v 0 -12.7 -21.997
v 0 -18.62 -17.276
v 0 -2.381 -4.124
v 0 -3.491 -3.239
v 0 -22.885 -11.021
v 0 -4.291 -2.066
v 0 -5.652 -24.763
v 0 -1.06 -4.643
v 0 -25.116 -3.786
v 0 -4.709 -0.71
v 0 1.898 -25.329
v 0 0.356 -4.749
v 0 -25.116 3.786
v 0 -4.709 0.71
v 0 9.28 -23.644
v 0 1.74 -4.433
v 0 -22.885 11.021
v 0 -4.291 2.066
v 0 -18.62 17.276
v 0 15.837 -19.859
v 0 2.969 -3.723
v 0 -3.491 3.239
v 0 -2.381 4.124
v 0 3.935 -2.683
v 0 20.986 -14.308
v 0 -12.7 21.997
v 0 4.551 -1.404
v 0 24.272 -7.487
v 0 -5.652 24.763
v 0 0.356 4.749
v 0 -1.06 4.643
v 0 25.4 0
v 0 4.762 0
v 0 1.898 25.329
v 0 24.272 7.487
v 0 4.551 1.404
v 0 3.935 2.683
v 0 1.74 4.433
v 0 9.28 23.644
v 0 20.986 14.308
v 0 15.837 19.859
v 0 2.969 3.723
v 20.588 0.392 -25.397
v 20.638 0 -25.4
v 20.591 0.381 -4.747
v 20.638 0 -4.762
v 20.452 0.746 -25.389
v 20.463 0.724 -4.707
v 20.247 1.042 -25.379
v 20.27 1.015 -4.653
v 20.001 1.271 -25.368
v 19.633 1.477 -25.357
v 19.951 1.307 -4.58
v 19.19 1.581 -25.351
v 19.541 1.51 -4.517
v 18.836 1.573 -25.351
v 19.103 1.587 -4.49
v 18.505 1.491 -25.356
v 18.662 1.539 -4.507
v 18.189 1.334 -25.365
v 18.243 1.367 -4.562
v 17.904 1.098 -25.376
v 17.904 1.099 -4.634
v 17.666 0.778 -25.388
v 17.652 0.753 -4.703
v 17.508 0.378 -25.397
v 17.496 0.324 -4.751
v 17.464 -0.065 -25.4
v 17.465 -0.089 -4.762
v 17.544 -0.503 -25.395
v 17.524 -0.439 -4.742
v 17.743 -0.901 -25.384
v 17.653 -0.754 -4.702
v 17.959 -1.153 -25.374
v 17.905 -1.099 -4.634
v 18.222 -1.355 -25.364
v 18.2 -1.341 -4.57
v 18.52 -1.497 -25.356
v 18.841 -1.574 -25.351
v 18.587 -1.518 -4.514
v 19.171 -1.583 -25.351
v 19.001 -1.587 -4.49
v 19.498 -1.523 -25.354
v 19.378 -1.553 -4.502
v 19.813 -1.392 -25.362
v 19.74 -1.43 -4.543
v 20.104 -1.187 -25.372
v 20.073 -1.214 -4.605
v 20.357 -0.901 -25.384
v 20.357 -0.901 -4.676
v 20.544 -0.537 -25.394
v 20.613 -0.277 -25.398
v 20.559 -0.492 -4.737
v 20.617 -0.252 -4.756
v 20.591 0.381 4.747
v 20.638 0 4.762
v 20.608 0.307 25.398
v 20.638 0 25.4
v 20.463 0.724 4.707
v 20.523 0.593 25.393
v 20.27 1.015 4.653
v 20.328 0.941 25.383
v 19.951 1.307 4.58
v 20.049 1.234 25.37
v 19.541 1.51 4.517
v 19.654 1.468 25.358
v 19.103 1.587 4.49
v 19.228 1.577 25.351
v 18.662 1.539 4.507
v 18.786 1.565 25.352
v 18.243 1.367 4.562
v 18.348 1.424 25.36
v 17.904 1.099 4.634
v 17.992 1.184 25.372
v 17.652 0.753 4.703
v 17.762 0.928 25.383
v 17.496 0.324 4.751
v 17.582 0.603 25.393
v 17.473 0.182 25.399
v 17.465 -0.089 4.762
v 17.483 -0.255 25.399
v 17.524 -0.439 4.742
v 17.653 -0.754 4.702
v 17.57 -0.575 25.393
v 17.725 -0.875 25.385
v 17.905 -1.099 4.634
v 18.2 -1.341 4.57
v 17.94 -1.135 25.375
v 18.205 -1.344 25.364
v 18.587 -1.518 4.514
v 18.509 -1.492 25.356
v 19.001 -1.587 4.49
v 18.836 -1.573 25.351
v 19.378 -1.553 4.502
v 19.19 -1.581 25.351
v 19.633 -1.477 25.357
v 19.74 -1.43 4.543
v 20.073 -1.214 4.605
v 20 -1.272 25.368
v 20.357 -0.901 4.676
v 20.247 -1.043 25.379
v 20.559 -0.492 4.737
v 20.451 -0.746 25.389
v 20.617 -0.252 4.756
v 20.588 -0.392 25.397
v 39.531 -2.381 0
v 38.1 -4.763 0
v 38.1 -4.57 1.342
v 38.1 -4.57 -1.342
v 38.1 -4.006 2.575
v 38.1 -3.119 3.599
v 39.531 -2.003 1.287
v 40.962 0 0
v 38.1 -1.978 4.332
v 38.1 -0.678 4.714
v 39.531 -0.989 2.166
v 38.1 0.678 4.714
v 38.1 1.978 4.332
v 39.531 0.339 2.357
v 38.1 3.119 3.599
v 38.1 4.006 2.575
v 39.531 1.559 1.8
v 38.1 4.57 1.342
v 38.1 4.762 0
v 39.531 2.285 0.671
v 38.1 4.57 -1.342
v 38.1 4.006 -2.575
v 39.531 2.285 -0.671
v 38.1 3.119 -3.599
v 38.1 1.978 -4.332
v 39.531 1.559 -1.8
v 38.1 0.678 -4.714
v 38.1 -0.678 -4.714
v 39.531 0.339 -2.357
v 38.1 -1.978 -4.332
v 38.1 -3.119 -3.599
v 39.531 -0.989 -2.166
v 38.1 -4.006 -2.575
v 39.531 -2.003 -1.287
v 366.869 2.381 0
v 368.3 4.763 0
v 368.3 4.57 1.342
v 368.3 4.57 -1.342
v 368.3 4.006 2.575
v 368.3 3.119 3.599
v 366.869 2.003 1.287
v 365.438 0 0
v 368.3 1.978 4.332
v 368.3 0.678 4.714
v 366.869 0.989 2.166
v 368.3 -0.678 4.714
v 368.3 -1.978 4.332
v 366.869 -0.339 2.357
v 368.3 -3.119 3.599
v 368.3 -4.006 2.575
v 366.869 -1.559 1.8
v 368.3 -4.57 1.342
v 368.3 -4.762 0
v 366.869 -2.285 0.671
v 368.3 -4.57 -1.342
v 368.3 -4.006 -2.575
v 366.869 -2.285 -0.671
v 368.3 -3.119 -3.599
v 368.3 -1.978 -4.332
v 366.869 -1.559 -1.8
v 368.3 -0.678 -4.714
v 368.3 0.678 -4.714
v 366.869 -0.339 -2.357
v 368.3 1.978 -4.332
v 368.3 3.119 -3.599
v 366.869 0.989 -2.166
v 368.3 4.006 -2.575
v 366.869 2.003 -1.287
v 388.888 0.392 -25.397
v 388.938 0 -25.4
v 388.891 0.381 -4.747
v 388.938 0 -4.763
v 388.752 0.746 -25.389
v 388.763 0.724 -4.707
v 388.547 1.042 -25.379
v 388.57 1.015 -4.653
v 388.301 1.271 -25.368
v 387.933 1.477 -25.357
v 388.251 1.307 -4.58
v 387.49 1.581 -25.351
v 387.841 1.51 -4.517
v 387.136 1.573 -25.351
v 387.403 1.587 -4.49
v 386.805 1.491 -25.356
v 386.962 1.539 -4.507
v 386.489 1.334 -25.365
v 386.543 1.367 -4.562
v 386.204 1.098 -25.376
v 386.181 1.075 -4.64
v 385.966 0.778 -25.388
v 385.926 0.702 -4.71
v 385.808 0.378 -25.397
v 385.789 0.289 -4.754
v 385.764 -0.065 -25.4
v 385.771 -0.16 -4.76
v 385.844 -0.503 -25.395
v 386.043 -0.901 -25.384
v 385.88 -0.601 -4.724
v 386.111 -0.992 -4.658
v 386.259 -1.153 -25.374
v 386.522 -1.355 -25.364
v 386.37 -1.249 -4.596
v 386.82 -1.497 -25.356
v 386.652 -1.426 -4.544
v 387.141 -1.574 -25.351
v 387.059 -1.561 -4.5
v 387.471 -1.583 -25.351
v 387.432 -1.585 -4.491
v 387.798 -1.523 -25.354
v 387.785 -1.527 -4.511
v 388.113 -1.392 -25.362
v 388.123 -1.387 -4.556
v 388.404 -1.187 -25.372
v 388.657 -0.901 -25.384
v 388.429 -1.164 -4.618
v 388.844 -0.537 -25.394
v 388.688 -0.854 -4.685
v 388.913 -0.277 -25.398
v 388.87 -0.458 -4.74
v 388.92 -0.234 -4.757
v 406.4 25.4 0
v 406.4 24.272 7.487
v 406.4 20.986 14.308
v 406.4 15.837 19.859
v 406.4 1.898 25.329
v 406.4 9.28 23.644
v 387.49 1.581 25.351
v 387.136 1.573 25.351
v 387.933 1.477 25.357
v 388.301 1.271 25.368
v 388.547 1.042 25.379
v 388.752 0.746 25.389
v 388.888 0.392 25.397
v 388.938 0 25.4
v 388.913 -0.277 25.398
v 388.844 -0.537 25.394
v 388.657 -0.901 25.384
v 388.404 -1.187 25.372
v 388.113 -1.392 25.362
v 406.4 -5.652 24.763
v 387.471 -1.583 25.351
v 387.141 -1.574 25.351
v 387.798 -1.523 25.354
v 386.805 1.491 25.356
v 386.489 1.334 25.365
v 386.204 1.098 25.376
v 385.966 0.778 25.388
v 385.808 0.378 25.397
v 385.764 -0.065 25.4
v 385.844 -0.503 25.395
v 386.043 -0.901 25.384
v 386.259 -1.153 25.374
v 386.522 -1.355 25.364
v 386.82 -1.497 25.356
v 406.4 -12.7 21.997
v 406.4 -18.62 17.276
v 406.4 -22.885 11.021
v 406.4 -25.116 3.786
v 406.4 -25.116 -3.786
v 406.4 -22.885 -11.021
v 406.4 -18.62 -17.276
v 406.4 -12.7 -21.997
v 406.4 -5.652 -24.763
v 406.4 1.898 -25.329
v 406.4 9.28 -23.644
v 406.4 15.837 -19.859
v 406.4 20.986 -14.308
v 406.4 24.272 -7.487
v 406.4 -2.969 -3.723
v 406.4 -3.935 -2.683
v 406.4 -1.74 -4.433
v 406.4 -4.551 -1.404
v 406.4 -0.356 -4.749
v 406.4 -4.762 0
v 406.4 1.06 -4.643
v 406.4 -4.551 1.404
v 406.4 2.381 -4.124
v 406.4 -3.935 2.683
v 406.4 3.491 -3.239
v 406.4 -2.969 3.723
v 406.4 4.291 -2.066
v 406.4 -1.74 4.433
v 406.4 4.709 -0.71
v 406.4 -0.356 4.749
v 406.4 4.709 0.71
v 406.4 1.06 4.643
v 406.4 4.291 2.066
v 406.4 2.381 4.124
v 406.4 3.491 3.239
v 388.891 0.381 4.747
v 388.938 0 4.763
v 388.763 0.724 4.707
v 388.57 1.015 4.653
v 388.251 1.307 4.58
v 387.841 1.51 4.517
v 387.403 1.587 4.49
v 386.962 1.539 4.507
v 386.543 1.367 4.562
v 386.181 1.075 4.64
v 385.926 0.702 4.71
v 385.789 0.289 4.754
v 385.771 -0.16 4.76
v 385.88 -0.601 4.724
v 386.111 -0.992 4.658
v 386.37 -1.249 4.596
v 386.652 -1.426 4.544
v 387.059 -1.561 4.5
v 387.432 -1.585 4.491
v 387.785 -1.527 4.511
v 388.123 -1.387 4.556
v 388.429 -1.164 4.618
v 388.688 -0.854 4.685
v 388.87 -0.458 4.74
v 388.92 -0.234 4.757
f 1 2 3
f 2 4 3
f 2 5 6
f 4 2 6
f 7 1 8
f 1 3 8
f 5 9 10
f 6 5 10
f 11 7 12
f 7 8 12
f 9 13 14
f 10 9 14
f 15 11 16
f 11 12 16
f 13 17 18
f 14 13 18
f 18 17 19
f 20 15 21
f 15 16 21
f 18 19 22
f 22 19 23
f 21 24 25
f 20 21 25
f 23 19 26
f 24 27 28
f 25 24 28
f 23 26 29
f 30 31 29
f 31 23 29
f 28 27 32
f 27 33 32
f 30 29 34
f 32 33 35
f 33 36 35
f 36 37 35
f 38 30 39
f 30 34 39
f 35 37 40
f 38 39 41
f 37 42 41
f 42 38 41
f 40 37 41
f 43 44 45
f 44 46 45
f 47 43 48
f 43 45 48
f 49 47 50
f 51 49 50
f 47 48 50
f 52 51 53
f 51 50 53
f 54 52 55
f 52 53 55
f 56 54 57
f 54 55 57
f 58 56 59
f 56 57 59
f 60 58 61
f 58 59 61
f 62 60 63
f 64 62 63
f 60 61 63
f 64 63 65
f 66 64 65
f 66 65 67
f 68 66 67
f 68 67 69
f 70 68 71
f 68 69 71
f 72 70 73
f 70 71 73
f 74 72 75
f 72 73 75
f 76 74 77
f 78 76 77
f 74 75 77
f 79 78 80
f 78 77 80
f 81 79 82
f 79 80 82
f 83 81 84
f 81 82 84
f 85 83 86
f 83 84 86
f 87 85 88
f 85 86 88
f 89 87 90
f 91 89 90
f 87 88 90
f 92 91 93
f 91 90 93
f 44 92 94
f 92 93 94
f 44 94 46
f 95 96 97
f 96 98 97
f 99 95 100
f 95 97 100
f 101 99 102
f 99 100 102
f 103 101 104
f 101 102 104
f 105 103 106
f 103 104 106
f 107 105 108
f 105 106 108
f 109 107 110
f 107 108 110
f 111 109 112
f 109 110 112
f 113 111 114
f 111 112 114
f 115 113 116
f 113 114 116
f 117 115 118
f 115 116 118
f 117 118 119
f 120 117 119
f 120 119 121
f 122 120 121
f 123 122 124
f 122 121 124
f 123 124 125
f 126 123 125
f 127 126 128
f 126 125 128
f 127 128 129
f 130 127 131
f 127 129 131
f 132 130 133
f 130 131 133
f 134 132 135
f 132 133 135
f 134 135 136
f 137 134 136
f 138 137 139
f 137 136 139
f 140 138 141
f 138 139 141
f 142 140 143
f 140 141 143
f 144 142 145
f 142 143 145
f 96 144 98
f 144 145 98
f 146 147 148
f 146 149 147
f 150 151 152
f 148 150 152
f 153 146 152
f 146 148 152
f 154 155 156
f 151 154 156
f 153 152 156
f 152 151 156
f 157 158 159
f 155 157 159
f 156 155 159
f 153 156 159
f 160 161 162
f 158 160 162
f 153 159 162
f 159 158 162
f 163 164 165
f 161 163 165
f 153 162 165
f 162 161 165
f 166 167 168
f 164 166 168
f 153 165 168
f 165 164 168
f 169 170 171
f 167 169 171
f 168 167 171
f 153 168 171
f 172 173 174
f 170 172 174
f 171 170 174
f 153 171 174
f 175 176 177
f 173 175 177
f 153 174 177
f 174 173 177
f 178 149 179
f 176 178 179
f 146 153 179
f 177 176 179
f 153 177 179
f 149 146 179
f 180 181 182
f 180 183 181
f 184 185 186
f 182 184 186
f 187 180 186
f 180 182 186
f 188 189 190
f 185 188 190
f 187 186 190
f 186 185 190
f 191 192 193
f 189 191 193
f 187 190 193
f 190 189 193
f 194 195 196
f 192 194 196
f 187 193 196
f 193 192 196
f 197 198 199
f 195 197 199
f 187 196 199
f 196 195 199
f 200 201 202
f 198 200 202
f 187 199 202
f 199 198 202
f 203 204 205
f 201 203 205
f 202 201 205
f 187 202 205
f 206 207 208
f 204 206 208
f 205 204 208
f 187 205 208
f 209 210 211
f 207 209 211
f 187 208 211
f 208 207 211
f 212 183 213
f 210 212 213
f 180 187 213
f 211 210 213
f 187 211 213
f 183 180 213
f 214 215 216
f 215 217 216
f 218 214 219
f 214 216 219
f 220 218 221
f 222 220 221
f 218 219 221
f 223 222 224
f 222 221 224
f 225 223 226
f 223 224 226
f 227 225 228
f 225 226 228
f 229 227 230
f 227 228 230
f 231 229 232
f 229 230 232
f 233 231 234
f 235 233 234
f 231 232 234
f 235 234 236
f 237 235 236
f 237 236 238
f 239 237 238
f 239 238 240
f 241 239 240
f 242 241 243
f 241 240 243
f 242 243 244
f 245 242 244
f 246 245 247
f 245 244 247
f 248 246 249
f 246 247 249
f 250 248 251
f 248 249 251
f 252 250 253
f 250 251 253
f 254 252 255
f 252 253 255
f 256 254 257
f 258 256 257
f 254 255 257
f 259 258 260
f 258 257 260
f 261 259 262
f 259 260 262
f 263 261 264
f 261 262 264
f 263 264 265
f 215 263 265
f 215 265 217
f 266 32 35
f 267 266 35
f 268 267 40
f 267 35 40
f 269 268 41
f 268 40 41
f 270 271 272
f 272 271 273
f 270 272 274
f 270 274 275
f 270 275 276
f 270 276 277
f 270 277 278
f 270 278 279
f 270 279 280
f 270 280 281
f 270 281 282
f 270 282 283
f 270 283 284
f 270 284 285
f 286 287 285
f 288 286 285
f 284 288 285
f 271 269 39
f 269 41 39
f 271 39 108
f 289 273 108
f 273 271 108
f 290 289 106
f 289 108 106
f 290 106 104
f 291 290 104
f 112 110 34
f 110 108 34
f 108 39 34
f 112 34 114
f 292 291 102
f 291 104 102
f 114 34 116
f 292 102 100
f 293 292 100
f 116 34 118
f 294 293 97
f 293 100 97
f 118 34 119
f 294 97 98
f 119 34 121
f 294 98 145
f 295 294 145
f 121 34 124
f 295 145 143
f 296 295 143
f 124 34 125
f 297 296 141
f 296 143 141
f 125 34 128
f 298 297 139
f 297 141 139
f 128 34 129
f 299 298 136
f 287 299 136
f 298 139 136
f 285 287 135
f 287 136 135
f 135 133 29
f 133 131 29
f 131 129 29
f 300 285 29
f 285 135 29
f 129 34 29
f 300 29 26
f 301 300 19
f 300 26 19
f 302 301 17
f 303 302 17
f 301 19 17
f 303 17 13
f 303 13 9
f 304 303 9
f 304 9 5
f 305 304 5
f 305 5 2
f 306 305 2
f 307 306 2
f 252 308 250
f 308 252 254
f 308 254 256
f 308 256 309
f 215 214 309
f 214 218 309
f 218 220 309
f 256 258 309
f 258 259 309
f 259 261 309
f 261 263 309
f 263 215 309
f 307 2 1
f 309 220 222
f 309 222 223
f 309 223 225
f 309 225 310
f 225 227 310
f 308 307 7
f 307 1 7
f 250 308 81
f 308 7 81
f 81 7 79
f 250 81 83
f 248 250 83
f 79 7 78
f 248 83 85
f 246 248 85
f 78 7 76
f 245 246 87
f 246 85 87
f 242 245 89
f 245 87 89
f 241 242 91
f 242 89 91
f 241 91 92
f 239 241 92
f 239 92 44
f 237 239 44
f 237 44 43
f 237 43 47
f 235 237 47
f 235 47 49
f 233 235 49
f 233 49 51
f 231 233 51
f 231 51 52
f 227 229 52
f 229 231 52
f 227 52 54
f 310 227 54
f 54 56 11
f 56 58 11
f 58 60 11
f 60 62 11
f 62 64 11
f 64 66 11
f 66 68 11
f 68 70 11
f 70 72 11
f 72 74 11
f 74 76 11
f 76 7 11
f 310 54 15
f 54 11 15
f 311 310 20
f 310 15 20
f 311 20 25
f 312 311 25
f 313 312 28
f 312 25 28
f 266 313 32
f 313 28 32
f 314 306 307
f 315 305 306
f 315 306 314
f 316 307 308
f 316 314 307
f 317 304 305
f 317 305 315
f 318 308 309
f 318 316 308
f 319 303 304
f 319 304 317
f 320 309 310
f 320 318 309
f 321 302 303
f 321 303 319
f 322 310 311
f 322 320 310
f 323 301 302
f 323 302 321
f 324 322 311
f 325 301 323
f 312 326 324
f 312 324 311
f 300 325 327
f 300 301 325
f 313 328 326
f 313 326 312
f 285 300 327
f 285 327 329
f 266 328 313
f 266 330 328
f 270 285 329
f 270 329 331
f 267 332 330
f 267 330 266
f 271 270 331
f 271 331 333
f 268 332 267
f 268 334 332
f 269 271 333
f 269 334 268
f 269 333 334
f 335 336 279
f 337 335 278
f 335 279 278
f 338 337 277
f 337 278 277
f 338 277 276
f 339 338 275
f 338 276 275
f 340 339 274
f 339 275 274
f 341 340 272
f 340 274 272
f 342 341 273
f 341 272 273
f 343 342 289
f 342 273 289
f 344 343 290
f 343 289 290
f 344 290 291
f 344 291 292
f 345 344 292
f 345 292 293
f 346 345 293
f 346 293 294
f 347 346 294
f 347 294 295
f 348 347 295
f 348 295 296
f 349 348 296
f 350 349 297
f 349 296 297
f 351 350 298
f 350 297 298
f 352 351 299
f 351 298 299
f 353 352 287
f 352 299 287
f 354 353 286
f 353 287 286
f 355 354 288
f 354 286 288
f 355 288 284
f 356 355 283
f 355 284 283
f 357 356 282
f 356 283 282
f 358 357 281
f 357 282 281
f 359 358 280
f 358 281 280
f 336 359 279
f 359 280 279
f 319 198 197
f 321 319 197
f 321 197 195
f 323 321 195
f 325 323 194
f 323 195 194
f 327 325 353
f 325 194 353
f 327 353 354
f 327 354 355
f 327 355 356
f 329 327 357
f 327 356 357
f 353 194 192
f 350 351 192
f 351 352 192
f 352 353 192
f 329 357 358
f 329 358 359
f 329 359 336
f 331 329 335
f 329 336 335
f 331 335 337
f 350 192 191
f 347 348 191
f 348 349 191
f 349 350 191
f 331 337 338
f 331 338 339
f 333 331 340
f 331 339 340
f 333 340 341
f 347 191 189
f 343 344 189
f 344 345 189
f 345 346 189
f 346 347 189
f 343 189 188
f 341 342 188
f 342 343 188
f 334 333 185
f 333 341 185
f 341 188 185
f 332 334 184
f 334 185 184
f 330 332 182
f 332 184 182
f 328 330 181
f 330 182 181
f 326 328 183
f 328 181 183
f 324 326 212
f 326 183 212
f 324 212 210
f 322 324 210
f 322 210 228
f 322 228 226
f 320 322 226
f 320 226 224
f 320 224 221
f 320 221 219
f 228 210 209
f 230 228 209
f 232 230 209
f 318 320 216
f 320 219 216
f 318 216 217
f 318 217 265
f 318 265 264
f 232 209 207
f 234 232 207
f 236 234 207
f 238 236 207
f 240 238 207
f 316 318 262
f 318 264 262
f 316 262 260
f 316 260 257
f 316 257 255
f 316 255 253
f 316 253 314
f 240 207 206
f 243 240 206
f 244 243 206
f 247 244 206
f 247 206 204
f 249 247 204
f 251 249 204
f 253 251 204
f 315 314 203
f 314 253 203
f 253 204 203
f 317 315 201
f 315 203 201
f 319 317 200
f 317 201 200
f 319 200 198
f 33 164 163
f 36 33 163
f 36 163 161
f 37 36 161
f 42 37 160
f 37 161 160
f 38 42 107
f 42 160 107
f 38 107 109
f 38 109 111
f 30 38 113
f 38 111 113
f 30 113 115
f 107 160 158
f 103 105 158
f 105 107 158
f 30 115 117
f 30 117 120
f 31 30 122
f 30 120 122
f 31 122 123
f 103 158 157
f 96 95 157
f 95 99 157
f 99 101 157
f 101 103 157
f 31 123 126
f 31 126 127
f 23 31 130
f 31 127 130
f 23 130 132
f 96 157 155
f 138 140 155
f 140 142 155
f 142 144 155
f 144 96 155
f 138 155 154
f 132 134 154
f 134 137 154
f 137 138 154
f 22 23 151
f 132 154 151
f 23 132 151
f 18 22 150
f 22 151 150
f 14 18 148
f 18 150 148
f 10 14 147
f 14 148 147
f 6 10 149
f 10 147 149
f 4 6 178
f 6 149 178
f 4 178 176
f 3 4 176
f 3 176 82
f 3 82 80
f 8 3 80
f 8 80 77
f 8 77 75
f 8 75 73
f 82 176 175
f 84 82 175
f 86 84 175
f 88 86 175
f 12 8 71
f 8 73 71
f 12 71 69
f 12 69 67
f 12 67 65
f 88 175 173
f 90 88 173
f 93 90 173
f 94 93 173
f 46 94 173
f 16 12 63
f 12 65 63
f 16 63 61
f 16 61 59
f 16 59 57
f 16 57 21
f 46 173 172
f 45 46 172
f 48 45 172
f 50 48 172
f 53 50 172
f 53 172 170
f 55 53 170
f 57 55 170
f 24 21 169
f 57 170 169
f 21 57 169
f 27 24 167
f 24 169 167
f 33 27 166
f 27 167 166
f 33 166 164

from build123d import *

# Parameters (mm, degrees)
F0_R     = 25.4
F1_DEPTH = 406.4
F3_D     = 9.525
F3_DEPTH = 38.1
F3_TIP   = 2.8615986981
F5_D     = 9.525
F5_DEPTH = 38.1
F5_TIP   = 2.8615986981
F6_R     = 1.5875
F7_DEPTH = 25.4
F9_DEPTH = 31.75


with BuildPart() as f1:
    # F0 (on Right) → F1 (new body)
    with BuildSketch(Plane.YZ):
        Circle(F0_R)
    extrude(amount=F1_DEPTH)

    # F3
    with Locations(Plane.YZ.offset(406.4)):
        with Locations((0, 0)):
            Hole(F3_D / 2, depth=F3_DEPTH)
            with Locations((0, 0, -(F3_DEPTH + F3_TIP / 2))):  # 118° drill point
                Cone(0, F3_D / 2, F3_TIP, mode=Mode.SUBTRACT)

    # F5
    with Locations(Plane(origin=(0, 0, 0), x_dir=(0, -1, 0), z_dir=(-1, 0, 0))):
        with Locations((0, 0)):
            Hole(F5_D / 2, depth=F5_DEPTH)
            with Locations((0, 0, -(F5_DEPTH + F5_TIP / 2))):  # 118° drill point
                Cone(0, F5_D / 2, F5_TIP, mode=Mode.SUBTRACT)


with BuildPart() as f7:
    # F6 (on Top) → F7 (new body, symmetric)
    with BuildSketch(Plane.XY):
        with Locations((19.05, 0)):
            Circle(F6_R)
    extrude(amount=F7_DEPTH, both=True)


with BuildPart() as f1_1:
    add(f1.part)

    # F8: cut F7
    add(f7.part, mode=Mode.SUBTRACT)


with BuildPart() as f9:
    # F6 (on Top) → F9 (new body, symmetric)
    with BuildSketch(Plane.XY):
        with Locations((387.35, 0)):
            Circle(F6_R)
    extrude(amount=F9_DEPTH, both=True)


with BuildPart() as f1_2:
    add(f1_1.part)

    # F10: cut F9
    add(f9.part, mode=Mode.SUBTRACT)


solid = f1_2.part
